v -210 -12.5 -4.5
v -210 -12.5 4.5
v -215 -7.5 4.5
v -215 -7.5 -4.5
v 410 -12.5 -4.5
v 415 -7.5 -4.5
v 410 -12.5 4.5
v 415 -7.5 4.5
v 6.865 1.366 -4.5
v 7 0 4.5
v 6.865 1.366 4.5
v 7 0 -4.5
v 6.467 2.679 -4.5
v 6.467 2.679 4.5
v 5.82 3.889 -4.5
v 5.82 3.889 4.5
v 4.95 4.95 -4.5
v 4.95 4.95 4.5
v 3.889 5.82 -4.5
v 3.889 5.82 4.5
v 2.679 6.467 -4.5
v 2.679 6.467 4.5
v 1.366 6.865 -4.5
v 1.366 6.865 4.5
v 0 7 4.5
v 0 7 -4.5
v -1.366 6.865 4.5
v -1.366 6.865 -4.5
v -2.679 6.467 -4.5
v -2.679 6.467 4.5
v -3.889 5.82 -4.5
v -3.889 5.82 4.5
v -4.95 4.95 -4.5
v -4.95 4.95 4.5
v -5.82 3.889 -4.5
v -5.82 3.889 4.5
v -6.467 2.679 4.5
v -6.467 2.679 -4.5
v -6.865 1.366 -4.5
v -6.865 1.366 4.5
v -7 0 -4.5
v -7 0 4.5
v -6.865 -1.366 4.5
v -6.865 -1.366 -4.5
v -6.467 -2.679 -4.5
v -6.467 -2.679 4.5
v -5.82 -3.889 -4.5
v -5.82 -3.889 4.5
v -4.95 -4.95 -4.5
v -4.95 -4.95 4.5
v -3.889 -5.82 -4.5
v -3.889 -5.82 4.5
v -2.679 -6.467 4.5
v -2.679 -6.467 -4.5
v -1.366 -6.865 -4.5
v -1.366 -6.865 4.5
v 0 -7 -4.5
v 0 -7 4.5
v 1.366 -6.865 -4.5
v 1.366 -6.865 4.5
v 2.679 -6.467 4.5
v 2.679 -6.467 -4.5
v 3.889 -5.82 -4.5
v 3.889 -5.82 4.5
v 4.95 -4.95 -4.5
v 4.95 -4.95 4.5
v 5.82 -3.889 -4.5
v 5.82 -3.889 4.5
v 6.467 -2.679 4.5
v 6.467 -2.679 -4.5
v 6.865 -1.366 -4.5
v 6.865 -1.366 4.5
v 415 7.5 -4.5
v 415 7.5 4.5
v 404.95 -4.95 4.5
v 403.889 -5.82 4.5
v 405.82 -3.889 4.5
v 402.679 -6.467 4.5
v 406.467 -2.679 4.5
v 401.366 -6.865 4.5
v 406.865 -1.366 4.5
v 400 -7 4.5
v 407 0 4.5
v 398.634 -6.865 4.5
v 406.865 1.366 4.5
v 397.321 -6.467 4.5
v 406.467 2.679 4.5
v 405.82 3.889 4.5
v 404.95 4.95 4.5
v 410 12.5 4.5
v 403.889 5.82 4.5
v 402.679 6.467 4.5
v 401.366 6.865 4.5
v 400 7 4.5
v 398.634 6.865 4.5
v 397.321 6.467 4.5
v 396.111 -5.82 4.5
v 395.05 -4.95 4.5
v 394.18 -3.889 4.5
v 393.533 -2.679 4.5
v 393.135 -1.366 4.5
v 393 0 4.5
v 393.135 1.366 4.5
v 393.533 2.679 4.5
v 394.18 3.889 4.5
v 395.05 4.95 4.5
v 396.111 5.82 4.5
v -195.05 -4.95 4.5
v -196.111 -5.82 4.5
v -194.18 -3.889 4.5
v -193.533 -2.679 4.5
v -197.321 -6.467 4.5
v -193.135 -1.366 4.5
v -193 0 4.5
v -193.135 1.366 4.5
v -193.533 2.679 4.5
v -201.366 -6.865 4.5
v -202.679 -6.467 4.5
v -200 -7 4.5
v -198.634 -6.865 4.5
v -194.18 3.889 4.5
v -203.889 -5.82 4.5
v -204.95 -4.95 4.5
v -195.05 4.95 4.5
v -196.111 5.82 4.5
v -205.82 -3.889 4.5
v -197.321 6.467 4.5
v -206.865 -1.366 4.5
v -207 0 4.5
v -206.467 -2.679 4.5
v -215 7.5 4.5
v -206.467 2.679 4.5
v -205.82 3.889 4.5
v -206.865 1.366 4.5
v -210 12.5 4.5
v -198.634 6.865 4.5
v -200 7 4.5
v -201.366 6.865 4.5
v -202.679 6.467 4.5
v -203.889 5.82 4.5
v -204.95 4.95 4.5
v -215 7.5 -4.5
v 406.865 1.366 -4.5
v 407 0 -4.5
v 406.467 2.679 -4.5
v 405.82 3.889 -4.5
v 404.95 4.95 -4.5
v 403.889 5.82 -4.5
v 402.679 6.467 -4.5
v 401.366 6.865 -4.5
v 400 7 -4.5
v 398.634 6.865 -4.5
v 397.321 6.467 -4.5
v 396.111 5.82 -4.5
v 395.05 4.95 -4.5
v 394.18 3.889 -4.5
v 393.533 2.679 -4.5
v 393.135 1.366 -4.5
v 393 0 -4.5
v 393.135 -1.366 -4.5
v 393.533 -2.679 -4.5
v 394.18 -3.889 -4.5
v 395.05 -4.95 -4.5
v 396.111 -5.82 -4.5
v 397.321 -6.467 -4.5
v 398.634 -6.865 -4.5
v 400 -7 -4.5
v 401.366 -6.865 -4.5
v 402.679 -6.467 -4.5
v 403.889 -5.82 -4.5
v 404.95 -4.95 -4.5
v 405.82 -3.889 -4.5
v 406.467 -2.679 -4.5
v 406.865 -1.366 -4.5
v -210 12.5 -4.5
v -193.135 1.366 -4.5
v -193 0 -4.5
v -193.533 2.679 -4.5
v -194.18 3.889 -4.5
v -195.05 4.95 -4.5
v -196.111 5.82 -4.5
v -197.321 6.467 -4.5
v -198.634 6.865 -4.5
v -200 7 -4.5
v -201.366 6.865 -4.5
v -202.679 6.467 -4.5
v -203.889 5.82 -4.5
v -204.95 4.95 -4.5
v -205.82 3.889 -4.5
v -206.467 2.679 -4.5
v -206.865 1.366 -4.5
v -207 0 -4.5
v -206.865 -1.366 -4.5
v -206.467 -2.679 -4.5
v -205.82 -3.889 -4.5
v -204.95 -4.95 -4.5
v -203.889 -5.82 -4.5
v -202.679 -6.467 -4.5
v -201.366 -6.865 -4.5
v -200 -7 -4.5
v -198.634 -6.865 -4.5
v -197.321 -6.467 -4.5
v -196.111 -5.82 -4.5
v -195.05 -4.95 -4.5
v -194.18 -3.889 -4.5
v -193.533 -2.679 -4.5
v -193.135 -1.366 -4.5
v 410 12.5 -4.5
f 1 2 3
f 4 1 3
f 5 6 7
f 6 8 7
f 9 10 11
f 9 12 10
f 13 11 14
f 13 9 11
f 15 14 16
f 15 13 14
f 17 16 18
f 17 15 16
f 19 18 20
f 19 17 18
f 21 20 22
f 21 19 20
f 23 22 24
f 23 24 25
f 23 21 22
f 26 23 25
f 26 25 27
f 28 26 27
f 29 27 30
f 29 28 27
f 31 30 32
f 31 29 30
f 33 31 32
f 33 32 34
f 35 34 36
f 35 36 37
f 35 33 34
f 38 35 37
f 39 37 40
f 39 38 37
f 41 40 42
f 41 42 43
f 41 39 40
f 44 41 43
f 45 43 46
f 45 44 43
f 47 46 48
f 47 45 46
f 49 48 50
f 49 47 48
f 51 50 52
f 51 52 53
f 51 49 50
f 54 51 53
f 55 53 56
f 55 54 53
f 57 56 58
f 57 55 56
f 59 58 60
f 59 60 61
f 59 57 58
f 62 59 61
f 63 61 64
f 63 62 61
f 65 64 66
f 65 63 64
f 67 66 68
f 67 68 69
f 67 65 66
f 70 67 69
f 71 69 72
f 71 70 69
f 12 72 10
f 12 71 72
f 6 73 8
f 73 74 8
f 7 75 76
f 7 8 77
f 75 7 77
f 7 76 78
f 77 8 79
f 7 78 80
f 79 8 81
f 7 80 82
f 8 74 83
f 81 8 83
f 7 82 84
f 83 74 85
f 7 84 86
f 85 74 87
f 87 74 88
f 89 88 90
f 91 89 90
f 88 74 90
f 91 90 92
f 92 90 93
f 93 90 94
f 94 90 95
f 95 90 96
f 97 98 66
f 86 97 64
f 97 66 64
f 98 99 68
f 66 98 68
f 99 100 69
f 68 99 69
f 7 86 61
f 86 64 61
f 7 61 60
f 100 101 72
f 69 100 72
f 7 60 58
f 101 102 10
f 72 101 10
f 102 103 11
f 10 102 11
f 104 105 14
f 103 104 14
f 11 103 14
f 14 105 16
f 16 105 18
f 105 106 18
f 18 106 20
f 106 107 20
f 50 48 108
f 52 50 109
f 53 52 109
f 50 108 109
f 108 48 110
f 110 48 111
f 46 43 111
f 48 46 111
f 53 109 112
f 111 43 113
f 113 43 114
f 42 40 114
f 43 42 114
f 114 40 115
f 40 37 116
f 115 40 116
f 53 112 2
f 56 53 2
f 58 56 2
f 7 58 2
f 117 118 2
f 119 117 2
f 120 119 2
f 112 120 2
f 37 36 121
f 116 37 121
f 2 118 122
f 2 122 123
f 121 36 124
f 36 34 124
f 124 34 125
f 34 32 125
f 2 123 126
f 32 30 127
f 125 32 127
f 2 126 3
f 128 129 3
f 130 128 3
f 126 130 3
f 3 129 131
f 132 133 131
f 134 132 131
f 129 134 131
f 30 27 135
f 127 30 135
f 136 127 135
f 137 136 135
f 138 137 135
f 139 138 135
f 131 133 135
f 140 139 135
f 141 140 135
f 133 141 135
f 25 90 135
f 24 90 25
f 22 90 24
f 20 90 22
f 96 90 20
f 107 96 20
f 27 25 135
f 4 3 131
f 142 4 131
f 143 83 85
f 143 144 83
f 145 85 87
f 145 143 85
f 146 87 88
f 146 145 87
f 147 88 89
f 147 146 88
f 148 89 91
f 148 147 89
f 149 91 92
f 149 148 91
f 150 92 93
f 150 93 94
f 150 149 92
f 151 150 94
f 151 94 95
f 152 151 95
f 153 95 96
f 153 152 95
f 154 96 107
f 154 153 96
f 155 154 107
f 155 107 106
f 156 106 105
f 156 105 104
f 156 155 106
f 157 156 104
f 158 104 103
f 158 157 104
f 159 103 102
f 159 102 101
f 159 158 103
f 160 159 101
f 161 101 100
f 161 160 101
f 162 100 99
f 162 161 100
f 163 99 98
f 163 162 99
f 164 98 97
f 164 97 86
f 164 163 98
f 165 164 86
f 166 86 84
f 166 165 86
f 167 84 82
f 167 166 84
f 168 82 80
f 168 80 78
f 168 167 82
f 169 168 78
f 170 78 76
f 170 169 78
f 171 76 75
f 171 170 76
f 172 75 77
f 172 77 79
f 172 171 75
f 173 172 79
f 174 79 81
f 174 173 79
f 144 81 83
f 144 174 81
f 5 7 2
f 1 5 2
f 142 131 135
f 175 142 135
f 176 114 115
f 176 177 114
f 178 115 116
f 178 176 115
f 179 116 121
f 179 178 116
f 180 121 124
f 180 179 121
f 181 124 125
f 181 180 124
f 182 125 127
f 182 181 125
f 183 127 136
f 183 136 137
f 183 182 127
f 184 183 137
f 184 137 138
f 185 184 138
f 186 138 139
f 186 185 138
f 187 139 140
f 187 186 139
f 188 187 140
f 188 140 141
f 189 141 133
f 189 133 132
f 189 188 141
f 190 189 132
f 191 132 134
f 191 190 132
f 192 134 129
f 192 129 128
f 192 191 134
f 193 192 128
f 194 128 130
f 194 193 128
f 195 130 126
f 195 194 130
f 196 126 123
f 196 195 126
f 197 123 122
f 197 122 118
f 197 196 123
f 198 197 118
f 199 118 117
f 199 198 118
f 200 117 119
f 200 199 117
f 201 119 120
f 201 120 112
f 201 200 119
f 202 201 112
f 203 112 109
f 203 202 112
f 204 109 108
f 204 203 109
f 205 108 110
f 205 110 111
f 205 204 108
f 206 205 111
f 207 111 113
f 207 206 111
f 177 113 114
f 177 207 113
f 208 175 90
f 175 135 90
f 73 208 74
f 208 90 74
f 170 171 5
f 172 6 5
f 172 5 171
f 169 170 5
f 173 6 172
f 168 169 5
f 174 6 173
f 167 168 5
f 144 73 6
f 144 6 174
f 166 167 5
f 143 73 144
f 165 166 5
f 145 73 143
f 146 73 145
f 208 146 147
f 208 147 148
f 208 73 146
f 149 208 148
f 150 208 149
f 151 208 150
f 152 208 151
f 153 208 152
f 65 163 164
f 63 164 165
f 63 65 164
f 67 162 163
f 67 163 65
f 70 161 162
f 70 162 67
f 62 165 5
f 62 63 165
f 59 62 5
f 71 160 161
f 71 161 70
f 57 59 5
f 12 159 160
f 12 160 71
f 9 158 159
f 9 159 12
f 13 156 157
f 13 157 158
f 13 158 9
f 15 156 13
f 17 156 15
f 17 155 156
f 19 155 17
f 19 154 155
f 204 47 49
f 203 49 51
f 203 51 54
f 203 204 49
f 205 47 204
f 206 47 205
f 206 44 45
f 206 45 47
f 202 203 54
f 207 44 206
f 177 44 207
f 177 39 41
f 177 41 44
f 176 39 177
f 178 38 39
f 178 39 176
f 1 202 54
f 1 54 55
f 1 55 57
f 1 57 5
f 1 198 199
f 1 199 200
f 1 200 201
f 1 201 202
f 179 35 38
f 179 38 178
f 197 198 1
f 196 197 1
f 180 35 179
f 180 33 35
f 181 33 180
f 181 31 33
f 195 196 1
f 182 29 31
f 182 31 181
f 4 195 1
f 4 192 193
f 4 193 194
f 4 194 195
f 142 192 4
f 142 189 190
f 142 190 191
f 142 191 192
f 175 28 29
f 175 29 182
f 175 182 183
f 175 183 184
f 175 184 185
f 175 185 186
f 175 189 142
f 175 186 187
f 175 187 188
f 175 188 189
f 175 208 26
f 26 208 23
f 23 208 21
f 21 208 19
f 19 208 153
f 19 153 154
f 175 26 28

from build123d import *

# Parameters (mm, degrees)
SKETCH_1_R      = 7
EXTRUDE_1_DEPTH = 4.5


with BuildPart() as part:
    # 草圖1 → 填料-伸長1 (new body, symmetric)
    with BuildSketch(Plane.XY):
        Polygon((-215, 7.5), (-210, 12.5), (410, 12.5), (415, 7.5), (415, -7.5), (410, -12.5), (-210, -12.5), (-215, -7.5), align=None)
        Circle(SKETCH_1_R, mode=Mode.SUBTRACT)
        with Locations((400, 0)):
            Circle(SKETCH_1_R, mode=Mode.SUBTRACT)
        with Locations((-200, 0)):
            Circle(SKETCH_1_R, mode=Mode.SUBTRACT)
    extrude(amount=EXTRUDE_1_DEPTH, both=True)


solid = part.part
